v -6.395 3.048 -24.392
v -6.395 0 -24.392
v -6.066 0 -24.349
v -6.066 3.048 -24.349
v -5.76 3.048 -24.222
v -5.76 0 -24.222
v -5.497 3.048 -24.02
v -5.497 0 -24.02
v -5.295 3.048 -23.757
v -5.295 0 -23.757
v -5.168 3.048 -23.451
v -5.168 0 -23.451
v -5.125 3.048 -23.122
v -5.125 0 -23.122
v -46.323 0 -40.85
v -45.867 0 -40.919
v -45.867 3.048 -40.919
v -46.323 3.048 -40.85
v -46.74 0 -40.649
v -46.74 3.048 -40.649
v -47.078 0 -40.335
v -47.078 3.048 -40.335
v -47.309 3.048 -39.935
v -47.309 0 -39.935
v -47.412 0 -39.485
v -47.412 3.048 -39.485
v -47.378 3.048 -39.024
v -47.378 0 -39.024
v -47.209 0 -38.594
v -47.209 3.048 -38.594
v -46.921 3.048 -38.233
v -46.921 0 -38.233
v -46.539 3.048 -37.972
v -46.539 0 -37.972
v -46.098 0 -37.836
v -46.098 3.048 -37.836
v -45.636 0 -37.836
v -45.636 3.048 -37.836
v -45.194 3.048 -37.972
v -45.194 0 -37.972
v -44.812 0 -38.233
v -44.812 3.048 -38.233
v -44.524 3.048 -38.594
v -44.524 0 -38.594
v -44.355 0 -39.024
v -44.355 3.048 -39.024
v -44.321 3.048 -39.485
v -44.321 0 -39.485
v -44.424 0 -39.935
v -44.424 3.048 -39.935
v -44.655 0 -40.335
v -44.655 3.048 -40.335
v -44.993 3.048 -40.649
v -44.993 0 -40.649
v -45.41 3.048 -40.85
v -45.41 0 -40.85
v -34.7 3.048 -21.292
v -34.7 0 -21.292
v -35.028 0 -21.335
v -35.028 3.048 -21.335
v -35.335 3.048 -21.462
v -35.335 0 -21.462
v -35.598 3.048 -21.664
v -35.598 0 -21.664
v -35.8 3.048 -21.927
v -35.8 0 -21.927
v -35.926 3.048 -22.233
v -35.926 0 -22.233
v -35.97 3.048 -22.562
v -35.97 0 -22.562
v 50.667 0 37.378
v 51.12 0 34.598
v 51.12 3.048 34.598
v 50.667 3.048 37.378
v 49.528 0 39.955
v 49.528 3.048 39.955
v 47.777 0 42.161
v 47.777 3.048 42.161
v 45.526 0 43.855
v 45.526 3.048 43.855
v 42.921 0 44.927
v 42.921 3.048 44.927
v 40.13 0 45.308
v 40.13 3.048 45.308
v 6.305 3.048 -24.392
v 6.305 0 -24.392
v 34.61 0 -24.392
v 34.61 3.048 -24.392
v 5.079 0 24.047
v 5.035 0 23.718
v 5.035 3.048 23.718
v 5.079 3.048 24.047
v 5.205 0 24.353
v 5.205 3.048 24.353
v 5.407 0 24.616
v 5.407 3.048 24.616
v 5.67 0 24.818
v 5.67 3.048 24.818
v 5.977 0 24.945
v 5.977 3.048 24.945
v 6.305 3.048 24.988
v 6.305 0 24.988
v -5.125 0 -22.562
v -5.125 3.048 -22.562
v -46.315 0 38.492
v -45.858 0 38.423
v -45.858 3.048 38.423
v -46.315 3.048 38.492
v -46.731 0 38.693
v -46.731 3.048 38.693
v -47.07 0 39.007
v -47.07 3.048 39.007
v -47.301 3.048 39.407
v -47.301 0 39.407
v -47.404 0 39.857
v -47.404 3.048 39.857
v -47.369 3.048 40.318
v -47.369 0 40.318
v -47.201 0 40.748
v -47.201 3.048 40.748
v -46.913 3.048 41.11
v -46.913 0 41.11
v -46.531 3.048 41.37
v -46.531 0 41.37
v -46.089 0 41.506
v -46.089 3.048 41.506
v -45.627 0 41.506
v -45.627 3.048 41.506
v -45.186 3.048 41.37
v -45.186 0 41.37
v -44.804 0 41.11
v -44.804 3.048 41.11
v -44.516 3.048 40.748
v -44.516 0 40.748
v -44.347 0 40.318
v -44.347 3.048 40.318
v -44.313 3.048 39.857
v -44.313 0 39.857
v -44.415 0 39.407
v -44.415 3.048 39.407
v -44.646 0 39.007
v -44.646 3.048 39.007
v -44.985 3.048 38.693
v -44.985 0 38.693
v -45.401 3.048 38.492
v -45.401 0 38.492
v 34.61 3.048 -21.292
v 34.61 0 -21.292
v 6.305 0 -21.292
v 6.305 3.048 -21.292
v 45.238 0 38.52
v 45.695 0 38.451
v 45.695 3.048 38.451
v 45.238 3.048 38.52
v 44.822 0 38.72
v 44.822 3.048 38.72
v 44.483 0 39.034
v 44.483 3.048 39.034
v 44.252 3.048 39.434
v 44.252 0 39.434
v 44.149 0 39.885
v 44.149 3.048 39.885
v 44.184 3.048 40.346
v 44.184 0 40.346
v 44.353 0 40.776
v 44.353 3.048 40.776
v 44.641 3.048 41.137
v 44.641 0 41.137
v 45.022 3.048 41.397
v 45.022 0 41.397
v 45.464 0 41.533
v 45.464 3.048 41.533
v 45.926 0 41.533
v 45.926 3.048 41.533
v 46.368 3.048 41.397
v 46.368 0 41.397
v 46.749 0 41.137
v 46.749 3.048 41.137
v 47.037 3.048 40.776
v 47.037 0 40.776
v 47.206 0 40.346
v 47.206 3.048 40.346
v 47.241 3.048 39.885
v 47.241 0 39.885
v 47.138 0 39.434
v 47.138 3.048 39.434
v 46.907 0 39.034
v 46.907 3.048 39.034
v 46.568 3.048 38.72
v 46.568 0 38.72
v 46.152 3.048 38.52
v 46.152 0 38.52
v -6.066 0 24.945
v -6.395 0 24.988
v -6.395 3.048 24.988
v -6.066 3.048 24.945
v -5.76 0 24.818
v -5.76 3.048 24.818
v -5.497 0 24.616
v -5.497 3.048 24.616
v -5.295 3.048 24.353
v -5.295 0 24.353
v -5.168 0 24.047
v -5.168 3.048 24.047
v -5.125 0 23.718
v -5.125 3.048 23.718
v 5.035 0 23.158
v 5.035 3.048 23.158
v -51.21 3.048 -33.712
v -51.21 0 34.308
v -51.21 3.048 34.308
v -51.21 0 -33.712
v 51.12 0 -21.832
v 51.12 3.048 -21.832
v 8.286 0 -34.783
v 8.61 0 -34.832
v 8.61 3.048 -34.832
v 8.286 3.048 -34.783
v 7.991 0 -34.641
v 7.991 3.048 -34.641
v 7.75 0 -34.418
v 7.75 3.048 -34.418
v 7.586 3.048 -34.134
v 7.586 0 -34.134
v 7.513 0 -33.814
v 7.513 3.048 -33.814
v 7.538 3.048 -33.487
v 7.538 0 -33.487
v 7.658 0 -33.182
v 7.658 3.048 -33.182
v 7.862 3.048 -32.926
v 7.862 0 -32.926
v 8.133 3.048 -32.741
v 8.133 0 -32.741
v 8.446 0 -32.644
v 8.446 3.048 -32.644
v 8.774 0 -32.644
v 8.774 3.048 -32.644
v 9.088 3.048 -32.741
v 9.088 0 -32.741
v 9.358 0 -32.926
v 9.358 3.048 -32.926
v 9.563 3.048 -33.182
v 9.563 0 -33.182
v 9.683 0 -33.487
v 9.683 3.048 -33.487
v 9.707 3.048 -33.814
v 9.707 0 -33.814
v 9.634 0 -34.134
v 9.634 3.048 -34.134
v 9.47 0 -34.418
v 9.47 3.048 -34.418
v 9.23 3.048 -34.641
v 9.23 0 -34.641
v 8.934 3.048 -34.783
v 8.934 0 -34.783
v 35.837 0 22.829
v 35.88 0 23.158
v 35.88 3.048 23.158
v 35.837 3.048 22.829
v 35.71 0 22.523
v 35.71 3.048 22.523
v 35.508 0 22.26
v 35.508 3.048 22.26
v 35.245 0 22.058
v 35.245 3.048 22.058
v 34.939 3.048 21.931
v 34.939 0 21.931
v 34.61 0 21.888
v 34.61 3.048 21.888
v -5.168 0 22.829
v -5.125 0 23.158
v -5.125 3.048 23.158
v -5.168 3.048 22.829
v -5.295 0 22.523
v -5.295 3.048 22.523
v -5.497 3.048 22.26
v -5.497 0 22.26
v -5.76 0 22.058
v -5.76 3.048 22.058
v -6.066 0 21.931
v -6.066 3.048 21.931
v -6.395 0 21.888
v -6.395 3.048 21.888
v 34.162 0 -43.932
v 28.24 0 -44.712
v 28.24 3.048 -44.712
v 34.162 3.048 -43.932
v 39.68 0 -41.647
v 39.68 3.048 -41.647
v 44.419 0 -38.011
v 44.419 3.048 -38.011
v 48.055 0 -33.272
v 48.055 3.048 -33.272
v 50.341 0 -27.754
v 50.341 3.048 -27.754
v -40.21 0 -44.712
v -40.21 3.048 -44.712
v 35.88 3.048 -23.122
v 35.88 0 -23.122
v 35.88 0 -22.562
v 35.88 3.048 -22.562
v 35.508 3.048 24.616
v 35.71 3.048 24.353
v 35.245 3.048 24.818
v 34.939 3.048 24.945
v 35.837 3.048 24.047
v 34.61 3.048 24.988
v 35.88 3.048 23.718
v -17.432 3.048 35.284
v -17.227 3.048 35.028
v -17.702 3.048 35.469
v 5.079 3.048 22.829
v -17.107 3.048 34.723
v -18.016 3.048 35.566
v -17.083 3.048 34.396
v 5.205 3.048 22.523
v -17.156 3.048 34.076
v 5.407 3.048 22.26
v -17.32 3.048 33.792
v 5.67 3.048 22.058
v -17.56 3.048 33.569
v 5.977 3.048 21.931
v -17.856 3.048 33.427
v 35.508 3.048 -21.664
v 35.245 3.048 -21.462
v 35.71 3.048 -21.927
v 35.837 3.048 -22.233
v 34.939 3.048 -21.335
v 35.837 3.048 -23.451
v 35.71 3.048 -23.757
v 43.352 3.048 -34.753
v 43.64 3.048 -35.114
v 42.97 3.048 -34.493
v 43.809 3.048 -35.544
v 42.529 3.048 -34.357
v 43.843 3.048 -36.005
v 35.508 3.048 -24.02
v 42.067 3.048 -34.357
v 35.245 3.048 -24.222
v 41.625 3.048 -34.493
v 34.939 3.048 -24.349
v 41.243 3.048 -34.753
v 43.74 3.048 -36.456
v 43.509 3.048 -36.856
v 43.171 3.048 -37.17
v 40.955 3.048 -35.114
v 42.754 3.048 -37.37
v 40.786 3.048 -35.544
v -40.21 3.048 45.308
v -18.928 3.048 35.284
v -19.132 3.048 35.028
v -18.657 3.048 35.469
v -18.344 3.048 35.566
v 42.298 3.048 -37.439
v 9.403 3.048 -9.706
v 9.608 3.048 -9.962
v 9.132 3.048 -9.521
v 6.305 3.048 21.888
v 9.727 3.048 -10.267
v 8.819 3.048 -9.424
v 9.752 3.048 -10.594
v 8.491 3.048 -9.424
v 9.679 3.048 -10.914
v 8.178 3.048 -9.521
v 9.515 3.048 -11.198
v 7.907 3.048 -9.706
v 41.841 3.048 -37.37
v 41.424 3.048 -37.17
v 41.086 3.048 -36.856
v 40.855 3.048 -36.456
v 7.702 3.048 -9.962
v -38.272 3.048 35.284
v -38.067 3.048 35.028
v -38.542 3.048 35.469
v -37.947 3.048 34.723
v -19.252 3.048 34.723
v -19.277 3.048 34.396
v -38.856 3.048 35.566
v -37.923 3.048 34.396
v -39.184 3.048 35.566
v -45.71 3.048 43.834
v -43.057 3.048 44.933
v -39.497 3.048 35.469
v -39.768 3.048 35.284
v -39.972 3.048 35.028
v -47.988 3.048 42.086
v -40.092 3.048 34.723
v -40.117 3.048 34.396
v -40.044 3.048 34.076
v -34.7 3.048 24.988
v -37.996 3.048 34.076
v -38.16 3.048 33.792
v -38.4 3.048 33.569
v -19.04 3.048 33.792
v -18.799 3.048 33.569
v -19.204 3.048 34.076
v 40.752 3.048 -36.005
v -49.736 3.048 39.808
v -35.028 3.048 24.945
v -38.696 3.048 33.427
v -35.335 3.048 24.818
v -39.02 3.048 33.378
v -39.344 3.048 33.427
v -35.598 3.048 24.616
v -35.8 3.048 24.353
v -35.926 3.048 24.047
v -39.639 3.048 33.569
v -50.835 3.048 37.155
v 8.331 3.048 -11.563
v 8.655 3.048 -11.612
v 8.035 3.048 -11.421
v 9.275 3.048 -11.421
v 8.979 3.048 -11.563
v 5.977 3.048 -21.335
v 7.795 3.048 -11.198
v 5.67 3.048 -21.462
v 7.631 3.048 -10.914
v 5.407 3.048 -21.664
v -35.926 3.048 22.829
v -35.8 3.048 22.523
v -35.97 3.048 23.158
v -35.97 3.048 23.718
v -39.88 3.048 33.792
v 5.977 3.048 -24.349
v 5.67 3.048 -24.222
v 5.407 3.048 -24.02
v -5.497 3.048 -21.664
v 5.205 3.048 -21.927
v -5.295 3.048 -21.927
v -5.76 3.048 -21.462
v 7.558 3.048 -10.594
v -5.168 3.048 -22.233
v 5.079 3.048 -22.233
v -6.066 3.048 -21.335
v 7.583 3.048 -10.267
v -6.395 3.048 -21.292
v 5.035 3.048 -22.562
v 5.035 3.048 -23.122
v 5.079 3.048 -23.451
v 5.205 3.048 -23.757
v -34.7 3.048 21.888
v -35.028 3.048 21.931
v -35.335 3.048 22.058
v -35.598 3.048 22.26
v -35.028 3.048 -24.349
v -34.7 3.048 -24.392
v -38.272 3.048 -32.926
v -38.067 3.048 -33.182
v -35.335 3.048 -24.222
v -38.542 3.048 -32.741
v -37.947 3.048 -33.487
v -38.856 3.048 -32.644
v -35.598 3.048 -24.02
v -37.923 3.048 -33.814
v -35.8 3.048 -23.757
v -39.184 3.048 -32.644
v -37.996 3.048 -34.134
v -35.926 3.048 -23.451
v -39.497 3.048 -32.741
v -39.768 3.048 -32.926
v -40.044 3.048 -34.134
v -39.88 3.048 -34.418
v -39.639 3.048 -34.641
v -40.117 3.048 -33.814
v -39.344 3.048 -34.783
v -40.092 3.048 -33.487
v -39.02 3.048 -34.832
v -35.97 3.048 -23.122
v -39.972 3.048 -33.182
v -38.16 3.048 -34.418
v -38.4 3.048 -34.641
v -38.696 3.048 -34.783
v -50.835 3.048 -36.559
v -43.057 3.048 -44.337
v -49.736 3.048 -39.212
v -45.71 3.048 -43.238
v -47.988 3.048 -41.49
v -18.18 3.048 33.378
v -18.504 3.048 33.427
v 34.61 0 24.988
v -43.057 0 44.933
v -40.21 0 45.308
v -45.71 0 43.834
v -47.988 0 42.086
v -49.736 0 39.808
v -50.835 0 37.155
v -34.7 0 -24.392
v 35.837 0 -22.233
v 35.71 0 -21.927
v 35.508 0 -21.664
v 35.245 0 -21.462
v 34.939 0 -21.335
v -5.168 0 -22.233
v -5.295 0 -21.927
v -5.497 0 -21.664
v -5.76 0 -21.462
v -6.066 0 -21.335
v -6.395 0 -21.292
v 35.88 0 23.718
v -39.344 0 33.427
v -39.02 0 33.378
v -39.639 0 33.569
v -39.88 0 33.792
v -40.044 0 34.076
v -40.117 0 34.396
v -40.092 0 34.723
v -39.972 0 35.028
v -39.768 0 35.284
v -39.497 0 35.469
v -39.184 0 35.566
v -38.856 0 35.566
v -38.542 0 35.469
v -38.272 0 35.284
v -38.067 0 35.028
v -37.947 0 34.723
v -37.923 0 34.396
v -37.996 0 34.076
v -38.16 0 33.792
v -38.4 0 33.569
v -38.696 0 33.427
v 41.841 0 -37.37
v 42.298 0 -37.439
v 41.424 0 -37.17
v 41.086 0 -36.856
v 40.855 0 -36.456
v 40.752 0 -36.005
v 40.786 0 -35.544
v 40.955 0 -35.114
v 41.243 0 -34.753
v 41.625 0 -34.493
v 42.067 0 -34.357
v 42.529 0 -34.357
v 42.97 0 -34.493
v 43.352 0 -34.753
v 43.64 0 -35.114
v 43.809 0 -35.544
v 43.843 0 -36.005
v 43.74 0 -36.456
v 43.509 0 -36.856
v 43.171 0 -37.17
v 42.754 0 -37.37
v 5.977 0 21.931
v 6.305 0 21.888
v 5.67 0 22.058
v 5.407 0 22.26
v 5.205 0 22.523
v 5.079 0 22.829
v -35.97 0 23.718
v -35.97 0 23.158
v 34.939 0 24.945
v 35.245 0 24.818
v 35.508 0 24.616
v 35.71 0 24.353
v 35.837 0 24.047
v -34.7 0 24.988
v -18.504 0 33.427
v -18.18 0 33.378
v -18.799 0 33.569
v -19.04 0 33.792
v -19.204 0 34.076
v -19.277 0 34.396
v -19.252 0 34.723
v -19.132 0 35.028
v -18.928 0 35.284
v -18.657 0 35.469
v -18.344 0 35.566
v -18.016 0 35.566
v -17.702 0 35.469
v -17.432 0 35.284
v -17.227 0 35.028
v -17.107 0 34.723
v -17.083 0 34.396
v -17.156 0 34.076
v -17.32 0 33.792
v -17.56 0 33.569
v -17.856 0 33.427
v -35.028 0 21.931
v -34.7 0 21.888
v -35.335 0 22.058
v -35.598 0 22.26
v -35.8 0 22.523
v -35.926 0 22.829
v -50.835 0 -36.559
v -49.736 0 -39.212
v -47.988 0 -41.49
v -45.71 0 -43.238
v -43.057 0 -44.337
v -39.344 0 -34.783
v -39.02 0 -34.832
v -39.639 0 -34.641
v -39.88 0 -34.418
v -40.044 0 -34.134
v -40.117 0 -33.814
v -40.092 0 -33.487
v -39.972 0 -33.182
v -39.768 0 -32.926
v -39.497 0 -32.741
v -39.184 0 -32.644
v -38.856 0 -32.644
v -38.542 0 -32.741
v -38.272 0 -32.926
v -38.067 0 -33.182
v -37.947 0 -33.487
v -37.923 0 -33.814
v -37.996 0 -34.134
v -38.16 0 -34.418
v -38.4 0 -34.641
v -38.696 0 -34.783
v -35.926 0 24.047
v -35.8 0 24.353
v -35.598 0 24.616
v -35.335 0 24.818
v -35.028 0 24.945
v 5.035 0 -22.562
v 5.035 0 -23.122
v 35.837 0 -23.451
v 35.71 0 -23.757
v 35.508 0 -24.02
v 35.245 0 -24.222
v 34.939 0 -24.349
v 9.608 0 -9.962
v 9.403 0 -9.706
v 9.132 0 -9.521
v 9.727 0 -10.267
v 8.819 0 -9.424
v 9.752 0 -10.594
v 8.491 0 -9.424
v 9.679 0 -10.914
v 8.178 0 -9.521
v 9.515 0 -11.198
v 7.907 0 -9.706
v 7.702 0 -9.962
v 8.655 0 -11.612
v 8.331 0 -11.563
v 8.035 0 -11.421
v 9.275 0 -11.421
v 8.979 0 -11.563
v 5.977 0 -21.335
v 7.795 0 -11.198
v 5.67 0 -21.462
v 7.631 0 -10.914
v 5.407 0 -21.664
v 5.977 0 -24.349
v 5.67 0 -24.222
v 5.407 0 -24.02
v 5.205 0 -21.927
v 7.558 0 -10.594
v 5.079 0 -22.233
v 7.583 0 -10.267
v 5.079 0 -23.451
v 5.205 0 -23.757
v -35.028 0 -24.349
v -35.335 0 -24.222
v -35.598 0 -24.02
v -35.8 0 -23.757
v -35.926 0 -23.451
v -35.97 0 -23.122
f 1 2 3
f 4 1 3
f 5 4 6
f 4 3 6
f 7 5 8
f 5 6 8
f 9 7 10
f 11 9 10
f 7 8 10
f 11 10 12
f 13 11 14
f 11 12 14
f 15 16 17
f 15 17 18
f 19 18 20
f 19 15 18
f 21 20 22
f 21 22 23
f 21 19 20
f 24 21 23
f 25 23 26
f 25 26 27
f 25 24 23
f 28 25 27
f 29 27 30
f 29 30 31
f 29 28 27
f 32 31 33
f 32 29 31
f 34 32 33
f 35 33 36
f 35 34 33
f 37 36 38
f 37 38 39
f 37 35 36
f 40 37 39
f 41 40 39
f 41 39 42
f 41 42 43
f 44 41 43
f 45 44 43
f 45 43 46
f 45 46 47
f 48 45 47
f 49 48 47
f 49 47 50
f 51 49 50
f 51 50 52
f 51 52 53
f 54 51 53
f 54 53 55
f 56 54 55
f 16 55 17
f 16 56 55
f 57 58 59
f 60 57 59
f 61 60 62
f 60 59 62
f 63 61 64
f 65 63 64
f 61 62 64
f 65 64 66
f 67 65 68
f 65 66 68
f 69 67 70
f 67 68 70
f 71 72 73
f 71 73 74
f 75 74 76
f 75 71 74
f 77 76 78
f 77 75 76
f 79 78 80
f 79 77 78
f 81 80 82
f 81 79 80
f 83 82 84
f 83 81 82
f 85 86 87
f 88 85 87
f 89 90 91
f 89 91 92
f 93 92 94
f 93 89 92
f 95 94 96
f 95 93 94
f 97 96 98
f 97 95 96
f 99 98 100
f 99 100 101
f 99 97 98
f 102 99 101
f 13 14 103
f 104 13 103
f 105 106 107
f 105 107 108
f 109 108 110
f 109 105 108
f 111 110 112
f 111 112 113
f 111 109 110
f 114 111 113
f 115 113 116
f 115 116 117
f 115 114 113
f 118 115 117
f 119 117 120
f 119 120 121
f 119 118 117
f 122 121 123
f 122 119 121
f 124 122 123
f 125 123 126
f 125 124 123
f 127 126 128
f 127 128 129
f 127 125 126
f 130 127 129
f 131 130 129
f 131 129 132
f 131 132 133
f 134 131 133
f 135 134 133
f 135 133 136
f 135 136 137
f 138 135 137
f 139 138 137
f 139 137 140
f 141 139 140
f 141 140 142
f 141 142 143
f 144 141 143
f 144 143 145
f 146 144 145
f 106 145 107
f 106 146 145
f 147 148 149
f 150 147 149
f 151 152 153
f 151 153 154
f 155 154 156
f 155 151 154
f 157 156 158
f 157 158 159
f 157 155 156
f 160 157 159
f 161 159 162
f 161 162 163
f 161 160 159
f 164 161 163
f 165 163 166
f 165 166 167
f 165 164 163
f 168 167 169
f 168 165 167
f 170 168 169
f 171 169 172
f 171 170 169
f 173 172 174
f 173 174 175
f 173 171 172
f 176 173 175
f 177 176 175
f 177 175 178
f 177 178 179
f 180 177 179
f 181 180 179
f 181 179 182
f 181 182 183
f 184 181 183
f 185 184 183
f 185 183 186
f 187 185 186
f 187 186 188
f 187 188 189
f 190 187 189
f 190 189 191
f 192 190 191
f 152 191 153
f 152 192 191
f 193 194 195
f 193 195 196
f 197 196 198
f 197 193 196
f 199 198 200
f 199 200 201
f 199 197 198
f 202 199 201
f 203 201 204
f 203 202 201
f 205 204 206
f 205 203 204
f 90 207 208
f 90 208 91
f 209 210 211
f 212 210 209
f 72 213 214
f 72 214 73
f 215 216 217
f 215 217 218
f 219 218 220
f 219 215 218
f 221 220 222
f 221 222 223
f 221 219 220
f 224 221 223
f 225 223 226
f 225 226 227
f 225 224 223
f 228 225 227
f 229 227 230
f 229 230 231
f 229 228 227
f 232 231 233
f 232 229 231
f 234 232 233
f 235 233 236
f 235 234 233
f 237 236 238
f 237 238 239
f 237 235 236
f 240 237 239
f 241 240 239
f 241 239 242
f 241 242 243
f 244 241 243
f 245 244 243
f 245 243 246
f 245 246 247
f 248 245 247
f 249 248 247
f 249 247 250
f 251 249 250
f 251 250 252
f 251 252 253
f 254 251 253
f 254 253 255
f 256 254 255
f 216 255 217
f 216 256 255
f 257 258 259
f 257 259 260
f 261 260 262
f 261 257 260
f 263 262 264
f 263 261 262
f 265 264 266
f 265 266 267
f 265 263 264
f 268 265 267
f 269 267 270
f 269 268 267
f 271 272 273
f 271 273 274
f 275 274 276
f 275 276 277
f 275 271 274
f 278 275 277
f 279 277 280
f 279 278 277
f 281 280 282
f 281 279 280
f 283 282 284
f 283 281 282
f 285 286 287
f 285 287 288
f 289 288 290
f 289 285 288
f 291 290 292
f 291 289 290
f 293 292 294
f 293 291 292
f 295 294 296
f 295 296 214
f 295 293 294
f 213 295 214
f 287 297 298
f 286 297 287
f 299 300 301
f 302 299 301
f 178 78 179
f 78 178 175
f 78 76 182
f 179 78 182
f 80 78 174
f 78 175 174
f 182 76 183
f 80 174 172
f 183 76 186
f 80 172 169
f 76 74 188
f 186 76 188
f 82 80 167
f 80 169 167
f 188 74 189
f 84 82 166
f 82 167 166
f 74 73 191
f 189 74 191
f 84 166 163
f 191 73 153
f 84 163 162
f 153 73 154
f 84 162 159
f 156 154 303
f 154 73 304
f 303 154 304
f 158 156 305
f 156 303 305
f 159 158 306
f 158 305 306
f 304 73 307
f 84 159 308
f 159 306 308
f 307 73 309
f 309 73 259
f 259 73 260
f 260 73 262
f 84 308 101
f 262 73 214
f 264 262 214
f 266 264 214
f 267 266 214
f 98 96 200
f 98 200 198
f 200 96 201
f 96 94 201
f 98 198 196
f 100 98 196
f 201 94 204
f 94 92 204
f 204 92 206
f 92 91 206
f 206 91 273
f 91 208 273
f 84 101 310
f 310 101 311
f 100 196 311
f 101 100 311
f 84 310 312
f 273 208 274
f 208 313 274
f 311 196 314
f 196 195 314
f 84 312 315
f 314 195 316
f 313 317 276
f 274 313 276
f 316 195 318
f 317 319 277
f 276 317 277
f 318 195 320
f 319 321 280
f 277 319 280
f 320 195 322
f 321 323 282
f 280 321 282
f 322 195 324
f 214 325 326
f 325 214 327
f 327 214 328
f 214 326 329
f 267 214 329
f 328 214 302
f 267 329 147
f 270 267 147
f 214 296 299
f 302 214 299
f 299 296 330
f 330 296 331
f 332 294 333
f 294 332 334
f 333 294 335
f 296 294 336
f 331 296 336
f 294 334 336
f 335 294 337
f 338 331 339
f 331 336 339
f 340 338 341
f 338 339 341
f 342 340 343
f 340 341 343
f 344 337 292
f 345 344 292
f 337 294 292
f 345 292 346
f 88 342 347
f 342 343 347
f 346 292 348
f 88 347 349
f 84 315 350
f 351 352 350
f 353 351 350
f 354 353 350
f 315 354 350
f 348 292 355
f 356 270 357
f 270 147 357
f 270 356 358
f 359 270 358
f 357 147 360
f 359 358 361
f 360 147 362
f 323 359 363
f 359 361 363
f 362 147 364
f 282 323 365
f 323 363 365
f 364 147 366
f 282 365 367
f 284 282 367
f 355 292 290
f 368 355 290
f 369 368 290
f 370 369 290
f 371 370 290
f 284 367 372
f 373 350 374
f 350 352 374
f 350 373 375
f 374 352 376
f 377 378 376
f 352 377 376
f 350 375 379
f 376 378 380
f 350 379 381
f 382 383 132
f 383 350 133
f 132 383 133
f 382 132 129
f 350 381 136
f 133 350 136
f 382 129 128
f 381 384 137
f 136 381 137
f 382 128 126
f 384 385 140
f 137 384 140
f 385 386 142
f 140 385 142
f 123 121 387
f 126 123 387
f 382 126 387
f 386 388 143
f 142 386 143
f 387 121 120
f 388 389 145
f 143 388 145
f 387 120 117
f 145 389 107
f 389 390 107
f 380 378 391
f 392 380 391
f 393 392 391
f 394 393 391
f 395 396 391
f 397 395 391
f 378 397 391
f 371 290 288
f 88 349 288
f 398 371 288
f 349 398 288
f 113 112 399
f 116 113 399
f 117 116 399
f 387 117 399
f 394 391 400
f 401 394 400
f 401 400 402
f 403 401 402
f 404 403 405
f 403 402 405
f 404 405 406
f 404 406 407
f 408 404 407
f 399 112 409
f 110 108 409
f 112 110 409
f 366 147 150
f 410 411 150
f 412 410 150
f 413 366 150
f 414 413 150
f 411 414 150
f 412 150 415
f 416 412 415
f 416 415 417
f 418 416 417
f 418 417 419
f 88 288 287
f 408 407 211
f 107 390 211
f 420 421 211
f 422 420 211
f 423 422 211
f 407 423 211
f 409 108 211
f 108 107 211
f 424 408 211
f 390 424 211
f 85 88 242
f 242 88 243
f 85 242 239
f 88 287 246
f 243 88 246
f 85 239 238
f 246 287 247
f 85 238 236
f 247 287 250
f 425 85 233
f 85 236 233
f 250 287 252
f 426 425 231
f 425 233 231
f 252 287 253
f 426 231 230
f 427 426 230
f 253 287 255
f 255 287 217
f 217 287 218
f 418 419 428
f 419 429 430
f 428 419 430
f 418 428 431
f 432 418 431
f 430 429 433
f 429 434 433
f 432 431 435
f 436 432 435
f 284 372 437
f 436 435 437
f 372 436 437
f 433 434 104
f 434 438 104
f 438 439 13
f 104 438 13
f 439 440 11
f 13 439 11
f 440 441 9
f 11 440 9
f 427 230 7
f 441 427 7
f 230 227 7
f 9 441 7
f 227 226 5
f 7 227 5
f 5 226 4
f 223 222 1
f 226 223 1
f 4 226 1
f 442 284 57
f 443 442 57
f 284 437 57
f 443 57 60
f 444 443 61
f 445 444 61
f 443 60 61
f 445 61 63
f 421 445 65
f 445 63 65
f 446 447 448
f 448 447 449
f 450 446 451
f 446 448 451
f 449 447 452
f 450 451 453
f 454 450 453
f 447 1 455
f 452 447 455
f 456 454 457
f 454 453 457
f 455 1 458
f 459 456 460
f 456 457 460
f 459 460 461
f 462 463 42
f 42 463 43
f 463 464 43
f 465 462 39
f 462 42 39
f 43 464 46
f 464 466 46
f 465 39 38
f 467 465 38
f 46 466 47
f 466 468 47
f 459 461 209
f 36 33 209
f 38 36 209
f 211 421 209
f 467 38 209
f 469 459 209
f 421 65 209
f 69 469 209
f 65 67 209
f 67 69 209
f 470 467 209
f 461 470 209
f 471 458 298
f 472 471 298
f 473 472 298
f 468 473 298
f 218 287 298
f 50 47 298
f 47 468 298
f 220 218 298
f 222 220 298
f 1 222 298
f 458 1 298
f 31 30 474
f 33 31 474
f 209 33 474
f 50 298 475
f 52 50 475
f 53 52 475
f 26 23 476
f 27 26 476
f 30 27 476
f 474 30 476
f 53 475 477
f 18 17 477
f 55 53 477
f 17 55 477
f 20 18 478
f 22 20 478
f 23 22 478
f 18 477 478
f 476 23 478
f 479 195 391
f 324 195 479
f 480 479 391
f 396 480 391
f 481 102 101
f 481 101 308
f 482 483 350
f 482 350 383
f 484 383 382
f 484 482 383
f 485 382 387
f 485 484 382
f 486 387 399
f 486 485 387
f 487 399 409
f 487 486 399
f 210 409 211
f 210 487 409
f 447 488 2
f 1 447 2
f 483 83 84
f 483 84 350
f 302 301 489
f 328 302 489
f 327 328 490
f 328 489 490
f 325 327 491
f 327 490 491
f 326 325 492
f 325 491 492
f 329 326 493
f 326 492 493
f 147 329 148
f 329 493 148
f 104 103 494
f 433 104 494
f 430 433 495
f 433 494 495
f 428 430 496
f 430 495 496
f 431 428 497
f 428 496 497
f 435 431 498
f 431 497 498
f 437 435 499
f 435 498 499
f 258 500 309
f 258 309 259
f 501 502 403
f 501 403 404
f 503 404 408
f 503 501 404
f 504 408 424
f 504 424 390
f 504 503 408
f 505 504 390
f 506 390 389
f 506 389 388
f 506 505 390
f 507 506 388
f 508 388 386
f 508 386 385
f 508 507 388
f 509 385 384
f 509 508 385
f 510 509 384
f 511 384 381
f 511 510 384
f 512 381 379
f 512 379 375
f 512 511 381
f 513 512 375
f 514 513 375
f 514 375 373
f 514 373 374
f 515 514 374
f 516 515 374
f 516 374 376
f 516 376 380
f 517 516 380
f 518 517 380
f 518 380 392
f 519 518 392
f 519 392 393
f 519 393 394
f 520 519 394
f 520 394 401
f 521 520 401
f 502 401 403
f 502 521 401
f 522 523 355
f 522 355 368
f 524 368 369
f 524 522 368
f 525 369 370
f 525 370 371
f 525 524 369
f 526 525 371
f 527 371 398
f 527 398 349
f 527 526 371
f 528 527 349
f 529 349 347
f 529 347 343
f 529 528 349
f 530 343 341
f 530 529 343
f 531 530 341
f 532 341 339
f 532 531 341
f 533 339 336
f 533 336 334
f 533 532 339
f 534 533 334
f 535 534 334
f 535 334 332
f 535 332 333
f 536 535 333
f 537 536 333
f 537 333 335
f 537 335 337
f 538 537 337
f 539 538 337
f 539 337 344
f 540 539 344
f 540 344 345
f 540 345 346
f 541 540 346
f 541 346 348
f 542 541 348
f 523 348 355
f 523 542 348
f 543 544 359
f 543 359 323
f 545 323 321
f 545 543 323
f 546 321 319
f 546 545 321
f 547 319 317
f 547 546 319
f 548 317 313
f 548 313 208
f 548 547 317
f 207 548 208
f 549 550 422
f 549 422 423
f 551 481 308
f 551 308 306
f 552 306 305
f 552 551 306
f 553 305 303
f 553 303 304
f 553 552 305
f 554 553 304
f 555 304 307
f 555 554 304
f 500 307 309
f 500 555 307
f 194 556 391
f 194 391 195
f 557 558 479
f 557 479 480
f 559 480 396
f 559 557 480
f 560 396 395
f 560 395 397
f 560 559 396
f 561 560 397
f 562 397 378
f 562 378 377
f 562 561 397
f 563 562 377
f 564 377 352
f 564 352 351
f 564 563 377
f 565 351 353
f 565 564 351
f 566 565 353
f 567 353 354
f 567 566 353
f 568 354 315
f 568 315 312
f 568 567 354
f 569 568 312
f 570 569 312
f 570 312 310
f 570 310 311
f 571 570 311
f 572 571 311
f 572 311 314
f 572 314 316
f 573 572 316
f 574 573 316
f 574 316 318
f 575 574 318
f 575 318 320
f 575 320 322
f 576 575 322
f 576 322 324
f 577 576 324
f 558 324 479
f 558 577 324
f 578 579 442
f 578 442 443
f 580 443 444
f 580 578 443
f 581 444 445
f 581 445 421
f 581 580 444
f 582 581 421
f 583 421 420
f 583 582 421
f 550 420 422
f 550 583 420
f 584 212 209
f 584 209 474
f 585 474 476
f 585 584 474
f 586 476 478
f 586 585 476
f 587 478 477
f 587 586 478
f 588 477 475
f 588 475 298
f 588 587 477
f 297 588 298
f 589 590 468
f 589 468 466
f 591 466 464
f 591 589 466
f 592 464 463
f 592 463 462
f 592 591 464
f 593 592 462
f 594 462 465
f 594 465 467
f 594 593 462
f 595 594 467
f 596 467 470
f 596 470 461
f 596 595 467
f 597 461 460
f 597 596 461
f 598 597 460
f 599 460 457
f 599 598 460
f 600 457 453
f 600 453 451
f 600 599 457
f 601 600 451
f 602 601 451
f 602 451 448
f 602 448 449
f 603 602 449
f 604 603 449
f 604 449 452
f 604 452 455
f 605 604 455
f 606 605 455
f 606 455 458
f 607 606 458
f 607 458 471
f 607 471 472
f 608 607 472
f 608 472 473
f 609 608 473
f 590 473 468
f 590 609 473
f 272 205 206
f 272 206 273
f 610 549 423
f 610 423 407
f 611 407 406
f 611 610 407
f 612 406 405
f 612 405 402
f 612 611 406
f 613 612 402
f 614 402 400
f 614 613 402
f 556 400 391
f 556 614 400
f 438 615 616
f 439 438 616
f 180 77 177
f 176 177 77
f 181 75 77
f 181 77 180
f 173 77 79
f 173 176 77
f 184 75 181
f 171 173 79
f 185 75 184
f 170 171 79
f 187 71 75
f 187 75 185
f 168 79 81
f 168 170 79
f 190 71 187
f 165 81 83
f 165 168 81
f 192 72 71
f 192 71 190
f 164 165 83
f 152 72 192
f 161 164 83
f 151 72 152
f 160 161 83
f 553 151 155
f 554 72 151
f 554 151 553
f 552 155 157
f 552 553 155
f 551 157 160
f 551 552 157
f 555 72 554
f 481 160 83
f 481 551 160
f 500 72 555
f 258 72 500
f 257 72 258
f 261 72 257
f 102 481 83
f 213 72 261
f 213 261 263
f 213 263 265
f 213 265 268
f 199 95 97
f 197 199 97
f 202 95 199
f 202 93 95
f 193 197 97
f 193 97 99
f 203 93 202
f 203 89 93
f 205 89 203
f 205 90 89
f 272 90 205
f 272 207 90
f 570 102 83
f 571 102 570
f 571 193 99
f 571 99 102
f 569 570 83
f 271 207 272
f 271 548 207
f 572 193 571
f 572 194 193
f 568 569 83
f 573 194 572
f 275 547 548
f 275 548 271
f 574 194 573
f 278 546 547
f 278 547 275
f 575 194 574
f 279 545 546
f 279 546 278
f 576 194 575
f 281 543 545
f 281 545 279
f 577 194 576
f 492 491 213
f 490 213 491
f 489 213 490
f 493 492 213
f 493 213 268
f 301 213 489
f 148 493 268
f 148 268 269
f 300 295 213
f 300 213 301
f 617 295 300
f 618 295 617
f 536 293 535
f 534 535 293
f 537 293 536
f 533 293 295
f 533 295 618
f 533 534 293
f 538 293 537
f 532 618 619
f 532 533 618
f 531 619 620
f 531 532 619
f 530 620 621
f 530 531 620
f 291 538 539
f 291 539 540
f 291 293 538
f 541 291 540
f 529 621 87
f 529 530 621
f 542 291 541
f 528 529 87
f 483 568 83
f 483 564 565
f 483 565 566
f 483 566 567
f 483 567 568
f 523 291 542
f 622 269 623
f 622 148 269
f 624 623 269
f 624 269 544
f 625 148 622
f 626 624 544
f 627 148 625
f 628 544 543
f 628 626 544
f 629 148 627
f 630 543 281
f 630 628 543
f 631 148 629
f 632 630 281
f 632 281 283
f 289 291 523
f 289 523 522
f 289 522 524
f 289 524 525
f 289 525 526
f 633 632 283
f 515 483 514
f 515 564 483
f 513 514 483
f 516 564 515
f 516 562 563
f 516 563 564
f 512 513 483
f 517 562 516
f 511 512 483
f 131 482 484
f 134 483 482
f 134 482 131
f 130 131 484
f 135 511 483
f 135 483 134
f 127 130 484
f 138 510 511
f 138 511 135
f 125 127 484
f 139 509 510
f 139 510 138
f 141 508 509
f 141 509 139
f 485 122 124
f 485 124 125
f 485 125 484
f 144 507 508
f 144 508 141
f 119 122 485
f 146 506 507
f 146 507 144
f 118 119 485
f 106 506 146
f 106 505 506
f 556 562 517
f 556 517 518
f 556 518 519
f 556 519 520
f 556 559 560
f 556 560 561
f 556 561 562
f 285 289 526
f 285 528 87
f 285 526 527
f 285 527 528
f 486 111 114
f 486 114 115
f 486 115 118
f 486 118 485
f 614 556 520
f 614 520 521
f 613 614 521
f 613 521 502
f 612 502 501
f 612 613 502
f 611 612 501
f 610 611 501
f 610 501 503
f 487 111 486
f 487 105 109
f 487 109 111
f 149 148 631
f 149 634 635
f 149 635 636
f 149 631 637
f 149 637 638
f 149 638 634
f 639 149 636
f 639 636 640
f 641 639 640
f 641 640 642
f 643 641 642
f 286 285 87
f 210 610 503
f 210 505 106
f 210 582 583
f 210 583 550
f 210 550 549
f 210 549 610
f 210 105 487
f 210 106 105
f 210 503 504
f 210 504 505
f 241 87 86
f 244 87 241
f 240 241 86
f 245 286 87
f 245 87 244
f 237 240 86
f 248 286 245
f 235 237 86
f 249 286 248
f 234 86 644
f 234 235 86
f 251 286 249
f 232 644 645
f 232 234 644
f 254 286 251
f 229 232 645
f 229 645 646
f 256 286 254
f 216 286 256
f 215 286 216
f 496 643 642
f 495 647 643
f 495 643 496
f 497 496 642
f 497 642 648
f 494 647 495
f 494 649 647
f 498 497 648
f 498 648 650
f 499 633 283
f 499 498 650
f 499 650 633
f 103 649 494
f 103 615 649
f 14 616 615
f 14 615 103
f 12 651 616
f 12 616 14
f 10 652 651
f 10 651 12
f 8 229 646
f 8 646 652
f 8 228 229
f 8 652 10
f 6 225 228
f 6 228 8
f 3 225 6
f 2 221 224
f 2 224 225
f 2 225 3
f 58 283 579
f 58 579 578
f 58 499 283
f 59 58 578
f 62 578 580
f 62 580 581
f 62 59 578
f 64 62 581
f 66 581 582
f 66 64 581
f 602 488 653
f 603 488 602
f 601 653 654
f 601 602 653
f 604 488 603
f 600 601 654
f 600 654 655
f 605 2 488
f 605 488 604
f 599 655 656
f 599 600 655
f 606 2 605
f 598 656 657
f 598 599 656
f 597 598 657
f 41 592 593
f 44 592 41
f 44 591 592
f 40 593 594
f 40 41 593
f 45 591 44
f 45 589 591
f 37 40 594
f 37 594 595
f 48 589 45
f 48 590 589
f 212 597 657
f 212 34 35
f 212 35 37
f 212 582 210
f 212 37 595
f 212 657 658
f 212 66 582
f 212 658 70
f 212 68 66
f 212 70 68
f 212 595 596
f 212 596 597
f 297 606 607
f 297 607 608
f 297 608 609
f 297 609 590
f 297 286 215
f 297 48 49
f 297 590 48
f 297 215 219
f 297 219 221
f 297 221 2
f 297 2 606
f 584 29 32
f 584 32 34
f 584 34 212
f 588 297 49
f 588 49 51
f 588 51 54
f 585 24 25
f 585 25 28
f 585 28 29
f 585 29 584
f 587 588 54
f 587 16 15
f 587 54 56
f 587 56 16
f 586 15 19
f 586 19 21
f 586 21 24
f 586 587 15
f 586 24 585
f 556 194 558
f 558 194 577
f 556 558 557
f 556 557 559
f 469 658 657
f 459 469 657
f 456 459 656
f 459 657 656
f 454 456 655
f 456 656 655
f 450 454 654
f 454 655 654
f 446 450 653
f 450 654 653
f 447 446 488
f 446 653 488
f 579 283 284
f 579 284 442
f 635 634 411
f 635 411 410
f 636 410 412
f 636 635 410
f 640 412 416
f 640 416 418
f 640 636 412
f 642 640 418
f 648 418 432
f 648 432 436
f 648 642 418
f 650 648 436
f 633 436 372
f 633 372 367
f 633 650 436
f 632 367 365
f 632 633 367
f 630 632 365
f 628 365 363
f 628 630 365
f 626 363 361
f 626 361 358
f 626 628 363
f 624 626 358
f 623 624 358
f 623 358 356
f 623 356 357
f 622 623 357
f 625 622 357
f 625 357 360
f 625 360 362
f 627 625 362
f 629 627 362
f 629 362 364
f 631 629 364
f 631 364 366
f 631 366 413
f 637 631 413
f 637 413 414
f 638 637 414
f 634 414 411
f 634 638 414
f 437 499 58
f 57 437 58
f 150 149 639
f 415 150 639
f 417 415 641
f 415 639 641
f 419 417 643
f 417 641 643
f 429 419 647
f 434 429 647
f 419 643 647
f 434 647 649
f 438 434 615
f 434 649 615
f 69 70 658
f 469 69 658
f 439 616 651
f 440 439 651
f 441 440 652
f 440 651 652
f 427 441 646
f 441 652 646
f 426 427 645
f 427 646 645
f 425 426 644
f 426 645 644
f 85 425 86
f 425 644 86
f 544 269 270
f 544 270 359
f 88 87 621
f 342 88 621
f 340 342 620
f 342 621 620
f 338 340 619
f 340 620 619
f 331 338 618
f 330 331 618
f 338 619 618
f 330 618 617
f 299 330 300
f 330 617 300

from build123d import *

# Parameters (mm, degrees)
SKETCH1_R           = 1.1
SKETCH1_R_2         = 1.55
BOSS_EXTRUDE1_DEPTH = 3.048


with BuildPart() as part:
    # Sketch1 → Boss-Extrude1 (new body)
    with BuildSketch(Plane(origin=(0, 0, 0), x_dir=(1, 0, 0), z_dir=(0, 1, 0))):
        with BuildLine():
            Line((-40.209744398, 44.711958299), (28.240255602, 44.711958299))
            ThreePointArc((28.240255602, 44.711958299), (44.41885963, 38.010560578), (51.120255602, 21.831955824))
            Line((51.120255602, 21.831955824), (51.120255602, -34.598189146))
            ThreePointArc((51.120255602, -34.598189146), (47.776738906, -42.160841434), (40.130306185, -45.308043388))
            Line((40.130306185, -45.308043388), (-40.209744398, -45.308043388))
            ThreePointArc((-40.209744398, -45.308043388), (-47.987919588, -42.086217385), (-51.209744398, -34.308041701))
            Line((-51.209744398, -34.308041701), (-51.209744398, 33.711958299))
            ThreePointArc((-51.209744398, 33.711958299), (-47.987918991, 41.490132892), (-40.209744398, 44.711958299))
        make_face()
        with Locations(Location((-39.019744398, -34.478043388, 0), (0, 0, 90))):
            Circle(SKETCH1_R, mode=Mode.SUBTRACT)
        with Locations(Location((-18.179744398, -34.478043388, 0), (0, 0, 90))):
            Circle(SKETCH1_R, mode=Mode.SUBTRACT)
        with Locations(Location((-39.019744398, 33.731958299, 0), (0, 0, 90))):
            Circle(SKETCH1_R, mode=Mode.SUBTRACT)
        with Locations(Location((8.610255602, 33.731915189, 0), (0, 0, 90))):
            Circle(SKETCH1_R, mode=Mode.SUBTRACT)
        with Locations(Location((8.655, 10.511958299, 0), (0, 0, 90))):
            Circle(SKETCH1_R, mode=Mode.SUBTRACT)
        with Locations(Location((-45.866598648, 39.368812549, 0), (0, 0, 90))):
            Circle(SKETCH1_R_2, mode=Mode.SUBTRACT)
        with Locations(Location((42.297539172, 35.889240349, 0), (0, 0, 90))):
            Circle(SKETCH1_R_2, mode=Mode.SUBTRACT)
        with Locations(Location((45.695011225, -40.000653974, 0), (0, 0, 90))):
            Circle(SKETCH1_R_2, mode=Mode.SUBTRACT)
        with Locations(Location((-45.858259021, -39.973270185, 0), (0, 0, 90))):
            Circle(SKETCH1_R_2, mode=Mode.SUBTRACT)
        with BuildLine():
            Line((-34.699744398, 24.391958299), (-6.394744398, 24.391958299))
            ThreePointArc((-6.394744398, 24.391958299), (-5.496718786, 24.019983911), (-5.124744398, 23.121958299))
            Line((-5.124744398, 23.121958299), (-5.124744398, 22.561958299))
            ThreePointArc((-5.124744398, 22.561958299), (-5.496718786, 21.663932687), (-6.394744398, 21.291958299))
            Line((-6.394744398, 21.291958299), (-34.699744398, 21.291958299))
            ThreePointArc((-34.699744398, 21.291958299), (-35.59777001, 21.663932687), (-35.969744398, 22.561958299))
            Line((-35.969744398, 22.561958299), (-35.969744398, 23.121958299))
            ThreePointArc((-35.969744398, 23.121958299), (-35.59777001, 24.019983911), (-34.699744398, 24.391958299))
        make_face(mode=Mode.SUBTRACT)
        with BuildLine():
            Line((35.880255602, 23.121958299), (35.880255602, 22.561958299))
            ThreePointArc((35.880255602, 22.561958299), (35.508281214, 21.663932687), (34.610255602, 21.291958299))
            Line((34.610255602, 21.291958299), (6.305255602, 21.291958299))
            ThreePointArc((6.305255602, 21.291958299), (5.40722999, 21.663932687), (5.035255602, 22.561958299))
            Line((5.035255602, 22.561958299), (5.035255602, 23.121958299))
            ThreePointArc((5.035255602, 23.121958299), (5.40722999, 24.019983911), (6.305255602, 24.391958299))
            Line((6.305255602, 24.391958299), (34.610255602, 24.391958299))
            ThreePointArc((34.610255602, 24.391958299), (35.508281214, 24.019983911), (35.880255602, 23.121958299))
        make_face(mode=Mode.SUBTRACT)
        with BuildLine():
            Line((35.880255602, -23.718041701), (35.880255602, -23.158041701))
            ThreePointArc((35.880255602, -23.158041701), (35.508281214, -22.260016089), (34.610255602, -21.888041701))
            Line((34.610255602, -21.888041701), (6.305255602, -21.888041701))
            ThreePointArc((6.305255602, -21.888041701), (5.40722999, -22.260016089), (5.035255602, -23.158041701))
            Line((5.035255602, -23.158041701), (5.035255602, -23.718041701))
            ThreePointArc((5.035255602, -23.718041701), (5.40722999, -24.616067313), (6.305255602, -24.988041701))
            Line((6.305255602, -24.988041701), (34.610255602, -24.988041701))
            ThreePointArc((34.610255602, -24.988041701), (35.508281214, -24.616067313), (35.880255602, -23.718041701))
        make_face(mode=Mode.SUBTRACT)
        with BuildLine():
            Line((-5.124744398, -23.718041701), (-5.124744398, -23.158041701))
            ThreePointArc((-5.124744398, -23.158041701), (-5.496718786, -22.260016089), (-6.394744398, -21.888041701))
            Line((-6.394744398, -21.888041701), (-34.699744398, -21.888041701))
            ThreePointArc((-34.699744398, -21.888041701), (-35.59777001, -22.260016089), (-35.969744398, -23.158041701))
            Line((-35.969744398, -23.158041701), (-35.969744398, -23.718041701))
            ThreePointArc((-35.969744398, -23.718041701), (-35.59777001, -24.616067313), (-34.699744398, -24.988041701))
            Line((-34.699744398, -24.988041701), (-6.394744398, -24.988041701))
            ThreePointArc((-6.394744398, -24.988041701), (-5.496718786, -24.616067313), (-5.124744398, -23.718041701))
        make_face(mode=Mode.SUBTRACT)
    extrude(amount=BOSS_EXTRUDE1_DEPTH)


solid = part.part
